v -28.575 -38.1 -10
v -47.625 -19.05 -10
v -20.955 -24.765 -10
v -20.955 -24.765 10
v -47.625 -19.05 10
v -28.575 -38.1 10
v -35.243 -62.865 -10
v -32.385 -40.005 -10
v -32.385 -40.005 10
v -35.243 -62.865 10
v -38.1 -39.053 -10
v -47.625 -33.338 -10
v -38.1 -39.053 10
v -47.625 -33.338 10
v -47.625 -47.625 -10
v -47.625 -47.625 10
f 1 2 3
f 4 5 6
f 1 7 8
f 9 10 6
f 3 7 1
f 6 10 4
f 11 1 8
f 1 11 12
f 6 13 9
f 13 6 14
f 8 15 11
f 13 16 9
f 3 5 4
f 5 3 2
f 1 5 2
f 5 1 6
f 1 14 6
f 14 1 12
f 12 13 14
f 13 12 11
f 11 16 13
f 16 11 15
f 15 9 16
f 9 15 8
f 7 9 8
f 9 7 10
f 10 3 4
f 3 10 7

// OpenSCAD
polyhedron(
    points=[
    [-20.955, -24.765, -10],
    [-47.625, -19.05, -10],
    [-28.575, -38.1, -10],
    [-47.625, -33.3375, -10],
    [-38.1, -39.0525, -10],
    [-47.625, -47.625, -10],
    [-32.385, -40.005, -10],
    [-35.2425, -62.865, -10],
    [-20.955, -24.765, 10],
    [-47.625, -19.05, 10],
    [-28.575, -38.1, 10],
    [-47.625, -33.3375, 10],
    [-38.1, -39.0525, 10],
    [-47.625, -47.625, 10],
    [-32.385, -40.005, 10],
    [-35.2425, -62.865, 10],
    ],
    faces=[
        [0,1,2],
        [10,9,8],
        [6,7,2],
        [10,15,14],
        [2,7,0],
        [8,15,10],
        [2,3,4,6],
        [14,12,11,10],
        [4,5,6],
        [14,13,12],
        [0,8,9,1],
        [1,9,10,2],
        [2,10,11,3],
        [3,11,12,4],
        [4,12,13,5],
        [5,13,14,6],
        [6,14,15,7],
        [7,15,8,0],
    ]
);
